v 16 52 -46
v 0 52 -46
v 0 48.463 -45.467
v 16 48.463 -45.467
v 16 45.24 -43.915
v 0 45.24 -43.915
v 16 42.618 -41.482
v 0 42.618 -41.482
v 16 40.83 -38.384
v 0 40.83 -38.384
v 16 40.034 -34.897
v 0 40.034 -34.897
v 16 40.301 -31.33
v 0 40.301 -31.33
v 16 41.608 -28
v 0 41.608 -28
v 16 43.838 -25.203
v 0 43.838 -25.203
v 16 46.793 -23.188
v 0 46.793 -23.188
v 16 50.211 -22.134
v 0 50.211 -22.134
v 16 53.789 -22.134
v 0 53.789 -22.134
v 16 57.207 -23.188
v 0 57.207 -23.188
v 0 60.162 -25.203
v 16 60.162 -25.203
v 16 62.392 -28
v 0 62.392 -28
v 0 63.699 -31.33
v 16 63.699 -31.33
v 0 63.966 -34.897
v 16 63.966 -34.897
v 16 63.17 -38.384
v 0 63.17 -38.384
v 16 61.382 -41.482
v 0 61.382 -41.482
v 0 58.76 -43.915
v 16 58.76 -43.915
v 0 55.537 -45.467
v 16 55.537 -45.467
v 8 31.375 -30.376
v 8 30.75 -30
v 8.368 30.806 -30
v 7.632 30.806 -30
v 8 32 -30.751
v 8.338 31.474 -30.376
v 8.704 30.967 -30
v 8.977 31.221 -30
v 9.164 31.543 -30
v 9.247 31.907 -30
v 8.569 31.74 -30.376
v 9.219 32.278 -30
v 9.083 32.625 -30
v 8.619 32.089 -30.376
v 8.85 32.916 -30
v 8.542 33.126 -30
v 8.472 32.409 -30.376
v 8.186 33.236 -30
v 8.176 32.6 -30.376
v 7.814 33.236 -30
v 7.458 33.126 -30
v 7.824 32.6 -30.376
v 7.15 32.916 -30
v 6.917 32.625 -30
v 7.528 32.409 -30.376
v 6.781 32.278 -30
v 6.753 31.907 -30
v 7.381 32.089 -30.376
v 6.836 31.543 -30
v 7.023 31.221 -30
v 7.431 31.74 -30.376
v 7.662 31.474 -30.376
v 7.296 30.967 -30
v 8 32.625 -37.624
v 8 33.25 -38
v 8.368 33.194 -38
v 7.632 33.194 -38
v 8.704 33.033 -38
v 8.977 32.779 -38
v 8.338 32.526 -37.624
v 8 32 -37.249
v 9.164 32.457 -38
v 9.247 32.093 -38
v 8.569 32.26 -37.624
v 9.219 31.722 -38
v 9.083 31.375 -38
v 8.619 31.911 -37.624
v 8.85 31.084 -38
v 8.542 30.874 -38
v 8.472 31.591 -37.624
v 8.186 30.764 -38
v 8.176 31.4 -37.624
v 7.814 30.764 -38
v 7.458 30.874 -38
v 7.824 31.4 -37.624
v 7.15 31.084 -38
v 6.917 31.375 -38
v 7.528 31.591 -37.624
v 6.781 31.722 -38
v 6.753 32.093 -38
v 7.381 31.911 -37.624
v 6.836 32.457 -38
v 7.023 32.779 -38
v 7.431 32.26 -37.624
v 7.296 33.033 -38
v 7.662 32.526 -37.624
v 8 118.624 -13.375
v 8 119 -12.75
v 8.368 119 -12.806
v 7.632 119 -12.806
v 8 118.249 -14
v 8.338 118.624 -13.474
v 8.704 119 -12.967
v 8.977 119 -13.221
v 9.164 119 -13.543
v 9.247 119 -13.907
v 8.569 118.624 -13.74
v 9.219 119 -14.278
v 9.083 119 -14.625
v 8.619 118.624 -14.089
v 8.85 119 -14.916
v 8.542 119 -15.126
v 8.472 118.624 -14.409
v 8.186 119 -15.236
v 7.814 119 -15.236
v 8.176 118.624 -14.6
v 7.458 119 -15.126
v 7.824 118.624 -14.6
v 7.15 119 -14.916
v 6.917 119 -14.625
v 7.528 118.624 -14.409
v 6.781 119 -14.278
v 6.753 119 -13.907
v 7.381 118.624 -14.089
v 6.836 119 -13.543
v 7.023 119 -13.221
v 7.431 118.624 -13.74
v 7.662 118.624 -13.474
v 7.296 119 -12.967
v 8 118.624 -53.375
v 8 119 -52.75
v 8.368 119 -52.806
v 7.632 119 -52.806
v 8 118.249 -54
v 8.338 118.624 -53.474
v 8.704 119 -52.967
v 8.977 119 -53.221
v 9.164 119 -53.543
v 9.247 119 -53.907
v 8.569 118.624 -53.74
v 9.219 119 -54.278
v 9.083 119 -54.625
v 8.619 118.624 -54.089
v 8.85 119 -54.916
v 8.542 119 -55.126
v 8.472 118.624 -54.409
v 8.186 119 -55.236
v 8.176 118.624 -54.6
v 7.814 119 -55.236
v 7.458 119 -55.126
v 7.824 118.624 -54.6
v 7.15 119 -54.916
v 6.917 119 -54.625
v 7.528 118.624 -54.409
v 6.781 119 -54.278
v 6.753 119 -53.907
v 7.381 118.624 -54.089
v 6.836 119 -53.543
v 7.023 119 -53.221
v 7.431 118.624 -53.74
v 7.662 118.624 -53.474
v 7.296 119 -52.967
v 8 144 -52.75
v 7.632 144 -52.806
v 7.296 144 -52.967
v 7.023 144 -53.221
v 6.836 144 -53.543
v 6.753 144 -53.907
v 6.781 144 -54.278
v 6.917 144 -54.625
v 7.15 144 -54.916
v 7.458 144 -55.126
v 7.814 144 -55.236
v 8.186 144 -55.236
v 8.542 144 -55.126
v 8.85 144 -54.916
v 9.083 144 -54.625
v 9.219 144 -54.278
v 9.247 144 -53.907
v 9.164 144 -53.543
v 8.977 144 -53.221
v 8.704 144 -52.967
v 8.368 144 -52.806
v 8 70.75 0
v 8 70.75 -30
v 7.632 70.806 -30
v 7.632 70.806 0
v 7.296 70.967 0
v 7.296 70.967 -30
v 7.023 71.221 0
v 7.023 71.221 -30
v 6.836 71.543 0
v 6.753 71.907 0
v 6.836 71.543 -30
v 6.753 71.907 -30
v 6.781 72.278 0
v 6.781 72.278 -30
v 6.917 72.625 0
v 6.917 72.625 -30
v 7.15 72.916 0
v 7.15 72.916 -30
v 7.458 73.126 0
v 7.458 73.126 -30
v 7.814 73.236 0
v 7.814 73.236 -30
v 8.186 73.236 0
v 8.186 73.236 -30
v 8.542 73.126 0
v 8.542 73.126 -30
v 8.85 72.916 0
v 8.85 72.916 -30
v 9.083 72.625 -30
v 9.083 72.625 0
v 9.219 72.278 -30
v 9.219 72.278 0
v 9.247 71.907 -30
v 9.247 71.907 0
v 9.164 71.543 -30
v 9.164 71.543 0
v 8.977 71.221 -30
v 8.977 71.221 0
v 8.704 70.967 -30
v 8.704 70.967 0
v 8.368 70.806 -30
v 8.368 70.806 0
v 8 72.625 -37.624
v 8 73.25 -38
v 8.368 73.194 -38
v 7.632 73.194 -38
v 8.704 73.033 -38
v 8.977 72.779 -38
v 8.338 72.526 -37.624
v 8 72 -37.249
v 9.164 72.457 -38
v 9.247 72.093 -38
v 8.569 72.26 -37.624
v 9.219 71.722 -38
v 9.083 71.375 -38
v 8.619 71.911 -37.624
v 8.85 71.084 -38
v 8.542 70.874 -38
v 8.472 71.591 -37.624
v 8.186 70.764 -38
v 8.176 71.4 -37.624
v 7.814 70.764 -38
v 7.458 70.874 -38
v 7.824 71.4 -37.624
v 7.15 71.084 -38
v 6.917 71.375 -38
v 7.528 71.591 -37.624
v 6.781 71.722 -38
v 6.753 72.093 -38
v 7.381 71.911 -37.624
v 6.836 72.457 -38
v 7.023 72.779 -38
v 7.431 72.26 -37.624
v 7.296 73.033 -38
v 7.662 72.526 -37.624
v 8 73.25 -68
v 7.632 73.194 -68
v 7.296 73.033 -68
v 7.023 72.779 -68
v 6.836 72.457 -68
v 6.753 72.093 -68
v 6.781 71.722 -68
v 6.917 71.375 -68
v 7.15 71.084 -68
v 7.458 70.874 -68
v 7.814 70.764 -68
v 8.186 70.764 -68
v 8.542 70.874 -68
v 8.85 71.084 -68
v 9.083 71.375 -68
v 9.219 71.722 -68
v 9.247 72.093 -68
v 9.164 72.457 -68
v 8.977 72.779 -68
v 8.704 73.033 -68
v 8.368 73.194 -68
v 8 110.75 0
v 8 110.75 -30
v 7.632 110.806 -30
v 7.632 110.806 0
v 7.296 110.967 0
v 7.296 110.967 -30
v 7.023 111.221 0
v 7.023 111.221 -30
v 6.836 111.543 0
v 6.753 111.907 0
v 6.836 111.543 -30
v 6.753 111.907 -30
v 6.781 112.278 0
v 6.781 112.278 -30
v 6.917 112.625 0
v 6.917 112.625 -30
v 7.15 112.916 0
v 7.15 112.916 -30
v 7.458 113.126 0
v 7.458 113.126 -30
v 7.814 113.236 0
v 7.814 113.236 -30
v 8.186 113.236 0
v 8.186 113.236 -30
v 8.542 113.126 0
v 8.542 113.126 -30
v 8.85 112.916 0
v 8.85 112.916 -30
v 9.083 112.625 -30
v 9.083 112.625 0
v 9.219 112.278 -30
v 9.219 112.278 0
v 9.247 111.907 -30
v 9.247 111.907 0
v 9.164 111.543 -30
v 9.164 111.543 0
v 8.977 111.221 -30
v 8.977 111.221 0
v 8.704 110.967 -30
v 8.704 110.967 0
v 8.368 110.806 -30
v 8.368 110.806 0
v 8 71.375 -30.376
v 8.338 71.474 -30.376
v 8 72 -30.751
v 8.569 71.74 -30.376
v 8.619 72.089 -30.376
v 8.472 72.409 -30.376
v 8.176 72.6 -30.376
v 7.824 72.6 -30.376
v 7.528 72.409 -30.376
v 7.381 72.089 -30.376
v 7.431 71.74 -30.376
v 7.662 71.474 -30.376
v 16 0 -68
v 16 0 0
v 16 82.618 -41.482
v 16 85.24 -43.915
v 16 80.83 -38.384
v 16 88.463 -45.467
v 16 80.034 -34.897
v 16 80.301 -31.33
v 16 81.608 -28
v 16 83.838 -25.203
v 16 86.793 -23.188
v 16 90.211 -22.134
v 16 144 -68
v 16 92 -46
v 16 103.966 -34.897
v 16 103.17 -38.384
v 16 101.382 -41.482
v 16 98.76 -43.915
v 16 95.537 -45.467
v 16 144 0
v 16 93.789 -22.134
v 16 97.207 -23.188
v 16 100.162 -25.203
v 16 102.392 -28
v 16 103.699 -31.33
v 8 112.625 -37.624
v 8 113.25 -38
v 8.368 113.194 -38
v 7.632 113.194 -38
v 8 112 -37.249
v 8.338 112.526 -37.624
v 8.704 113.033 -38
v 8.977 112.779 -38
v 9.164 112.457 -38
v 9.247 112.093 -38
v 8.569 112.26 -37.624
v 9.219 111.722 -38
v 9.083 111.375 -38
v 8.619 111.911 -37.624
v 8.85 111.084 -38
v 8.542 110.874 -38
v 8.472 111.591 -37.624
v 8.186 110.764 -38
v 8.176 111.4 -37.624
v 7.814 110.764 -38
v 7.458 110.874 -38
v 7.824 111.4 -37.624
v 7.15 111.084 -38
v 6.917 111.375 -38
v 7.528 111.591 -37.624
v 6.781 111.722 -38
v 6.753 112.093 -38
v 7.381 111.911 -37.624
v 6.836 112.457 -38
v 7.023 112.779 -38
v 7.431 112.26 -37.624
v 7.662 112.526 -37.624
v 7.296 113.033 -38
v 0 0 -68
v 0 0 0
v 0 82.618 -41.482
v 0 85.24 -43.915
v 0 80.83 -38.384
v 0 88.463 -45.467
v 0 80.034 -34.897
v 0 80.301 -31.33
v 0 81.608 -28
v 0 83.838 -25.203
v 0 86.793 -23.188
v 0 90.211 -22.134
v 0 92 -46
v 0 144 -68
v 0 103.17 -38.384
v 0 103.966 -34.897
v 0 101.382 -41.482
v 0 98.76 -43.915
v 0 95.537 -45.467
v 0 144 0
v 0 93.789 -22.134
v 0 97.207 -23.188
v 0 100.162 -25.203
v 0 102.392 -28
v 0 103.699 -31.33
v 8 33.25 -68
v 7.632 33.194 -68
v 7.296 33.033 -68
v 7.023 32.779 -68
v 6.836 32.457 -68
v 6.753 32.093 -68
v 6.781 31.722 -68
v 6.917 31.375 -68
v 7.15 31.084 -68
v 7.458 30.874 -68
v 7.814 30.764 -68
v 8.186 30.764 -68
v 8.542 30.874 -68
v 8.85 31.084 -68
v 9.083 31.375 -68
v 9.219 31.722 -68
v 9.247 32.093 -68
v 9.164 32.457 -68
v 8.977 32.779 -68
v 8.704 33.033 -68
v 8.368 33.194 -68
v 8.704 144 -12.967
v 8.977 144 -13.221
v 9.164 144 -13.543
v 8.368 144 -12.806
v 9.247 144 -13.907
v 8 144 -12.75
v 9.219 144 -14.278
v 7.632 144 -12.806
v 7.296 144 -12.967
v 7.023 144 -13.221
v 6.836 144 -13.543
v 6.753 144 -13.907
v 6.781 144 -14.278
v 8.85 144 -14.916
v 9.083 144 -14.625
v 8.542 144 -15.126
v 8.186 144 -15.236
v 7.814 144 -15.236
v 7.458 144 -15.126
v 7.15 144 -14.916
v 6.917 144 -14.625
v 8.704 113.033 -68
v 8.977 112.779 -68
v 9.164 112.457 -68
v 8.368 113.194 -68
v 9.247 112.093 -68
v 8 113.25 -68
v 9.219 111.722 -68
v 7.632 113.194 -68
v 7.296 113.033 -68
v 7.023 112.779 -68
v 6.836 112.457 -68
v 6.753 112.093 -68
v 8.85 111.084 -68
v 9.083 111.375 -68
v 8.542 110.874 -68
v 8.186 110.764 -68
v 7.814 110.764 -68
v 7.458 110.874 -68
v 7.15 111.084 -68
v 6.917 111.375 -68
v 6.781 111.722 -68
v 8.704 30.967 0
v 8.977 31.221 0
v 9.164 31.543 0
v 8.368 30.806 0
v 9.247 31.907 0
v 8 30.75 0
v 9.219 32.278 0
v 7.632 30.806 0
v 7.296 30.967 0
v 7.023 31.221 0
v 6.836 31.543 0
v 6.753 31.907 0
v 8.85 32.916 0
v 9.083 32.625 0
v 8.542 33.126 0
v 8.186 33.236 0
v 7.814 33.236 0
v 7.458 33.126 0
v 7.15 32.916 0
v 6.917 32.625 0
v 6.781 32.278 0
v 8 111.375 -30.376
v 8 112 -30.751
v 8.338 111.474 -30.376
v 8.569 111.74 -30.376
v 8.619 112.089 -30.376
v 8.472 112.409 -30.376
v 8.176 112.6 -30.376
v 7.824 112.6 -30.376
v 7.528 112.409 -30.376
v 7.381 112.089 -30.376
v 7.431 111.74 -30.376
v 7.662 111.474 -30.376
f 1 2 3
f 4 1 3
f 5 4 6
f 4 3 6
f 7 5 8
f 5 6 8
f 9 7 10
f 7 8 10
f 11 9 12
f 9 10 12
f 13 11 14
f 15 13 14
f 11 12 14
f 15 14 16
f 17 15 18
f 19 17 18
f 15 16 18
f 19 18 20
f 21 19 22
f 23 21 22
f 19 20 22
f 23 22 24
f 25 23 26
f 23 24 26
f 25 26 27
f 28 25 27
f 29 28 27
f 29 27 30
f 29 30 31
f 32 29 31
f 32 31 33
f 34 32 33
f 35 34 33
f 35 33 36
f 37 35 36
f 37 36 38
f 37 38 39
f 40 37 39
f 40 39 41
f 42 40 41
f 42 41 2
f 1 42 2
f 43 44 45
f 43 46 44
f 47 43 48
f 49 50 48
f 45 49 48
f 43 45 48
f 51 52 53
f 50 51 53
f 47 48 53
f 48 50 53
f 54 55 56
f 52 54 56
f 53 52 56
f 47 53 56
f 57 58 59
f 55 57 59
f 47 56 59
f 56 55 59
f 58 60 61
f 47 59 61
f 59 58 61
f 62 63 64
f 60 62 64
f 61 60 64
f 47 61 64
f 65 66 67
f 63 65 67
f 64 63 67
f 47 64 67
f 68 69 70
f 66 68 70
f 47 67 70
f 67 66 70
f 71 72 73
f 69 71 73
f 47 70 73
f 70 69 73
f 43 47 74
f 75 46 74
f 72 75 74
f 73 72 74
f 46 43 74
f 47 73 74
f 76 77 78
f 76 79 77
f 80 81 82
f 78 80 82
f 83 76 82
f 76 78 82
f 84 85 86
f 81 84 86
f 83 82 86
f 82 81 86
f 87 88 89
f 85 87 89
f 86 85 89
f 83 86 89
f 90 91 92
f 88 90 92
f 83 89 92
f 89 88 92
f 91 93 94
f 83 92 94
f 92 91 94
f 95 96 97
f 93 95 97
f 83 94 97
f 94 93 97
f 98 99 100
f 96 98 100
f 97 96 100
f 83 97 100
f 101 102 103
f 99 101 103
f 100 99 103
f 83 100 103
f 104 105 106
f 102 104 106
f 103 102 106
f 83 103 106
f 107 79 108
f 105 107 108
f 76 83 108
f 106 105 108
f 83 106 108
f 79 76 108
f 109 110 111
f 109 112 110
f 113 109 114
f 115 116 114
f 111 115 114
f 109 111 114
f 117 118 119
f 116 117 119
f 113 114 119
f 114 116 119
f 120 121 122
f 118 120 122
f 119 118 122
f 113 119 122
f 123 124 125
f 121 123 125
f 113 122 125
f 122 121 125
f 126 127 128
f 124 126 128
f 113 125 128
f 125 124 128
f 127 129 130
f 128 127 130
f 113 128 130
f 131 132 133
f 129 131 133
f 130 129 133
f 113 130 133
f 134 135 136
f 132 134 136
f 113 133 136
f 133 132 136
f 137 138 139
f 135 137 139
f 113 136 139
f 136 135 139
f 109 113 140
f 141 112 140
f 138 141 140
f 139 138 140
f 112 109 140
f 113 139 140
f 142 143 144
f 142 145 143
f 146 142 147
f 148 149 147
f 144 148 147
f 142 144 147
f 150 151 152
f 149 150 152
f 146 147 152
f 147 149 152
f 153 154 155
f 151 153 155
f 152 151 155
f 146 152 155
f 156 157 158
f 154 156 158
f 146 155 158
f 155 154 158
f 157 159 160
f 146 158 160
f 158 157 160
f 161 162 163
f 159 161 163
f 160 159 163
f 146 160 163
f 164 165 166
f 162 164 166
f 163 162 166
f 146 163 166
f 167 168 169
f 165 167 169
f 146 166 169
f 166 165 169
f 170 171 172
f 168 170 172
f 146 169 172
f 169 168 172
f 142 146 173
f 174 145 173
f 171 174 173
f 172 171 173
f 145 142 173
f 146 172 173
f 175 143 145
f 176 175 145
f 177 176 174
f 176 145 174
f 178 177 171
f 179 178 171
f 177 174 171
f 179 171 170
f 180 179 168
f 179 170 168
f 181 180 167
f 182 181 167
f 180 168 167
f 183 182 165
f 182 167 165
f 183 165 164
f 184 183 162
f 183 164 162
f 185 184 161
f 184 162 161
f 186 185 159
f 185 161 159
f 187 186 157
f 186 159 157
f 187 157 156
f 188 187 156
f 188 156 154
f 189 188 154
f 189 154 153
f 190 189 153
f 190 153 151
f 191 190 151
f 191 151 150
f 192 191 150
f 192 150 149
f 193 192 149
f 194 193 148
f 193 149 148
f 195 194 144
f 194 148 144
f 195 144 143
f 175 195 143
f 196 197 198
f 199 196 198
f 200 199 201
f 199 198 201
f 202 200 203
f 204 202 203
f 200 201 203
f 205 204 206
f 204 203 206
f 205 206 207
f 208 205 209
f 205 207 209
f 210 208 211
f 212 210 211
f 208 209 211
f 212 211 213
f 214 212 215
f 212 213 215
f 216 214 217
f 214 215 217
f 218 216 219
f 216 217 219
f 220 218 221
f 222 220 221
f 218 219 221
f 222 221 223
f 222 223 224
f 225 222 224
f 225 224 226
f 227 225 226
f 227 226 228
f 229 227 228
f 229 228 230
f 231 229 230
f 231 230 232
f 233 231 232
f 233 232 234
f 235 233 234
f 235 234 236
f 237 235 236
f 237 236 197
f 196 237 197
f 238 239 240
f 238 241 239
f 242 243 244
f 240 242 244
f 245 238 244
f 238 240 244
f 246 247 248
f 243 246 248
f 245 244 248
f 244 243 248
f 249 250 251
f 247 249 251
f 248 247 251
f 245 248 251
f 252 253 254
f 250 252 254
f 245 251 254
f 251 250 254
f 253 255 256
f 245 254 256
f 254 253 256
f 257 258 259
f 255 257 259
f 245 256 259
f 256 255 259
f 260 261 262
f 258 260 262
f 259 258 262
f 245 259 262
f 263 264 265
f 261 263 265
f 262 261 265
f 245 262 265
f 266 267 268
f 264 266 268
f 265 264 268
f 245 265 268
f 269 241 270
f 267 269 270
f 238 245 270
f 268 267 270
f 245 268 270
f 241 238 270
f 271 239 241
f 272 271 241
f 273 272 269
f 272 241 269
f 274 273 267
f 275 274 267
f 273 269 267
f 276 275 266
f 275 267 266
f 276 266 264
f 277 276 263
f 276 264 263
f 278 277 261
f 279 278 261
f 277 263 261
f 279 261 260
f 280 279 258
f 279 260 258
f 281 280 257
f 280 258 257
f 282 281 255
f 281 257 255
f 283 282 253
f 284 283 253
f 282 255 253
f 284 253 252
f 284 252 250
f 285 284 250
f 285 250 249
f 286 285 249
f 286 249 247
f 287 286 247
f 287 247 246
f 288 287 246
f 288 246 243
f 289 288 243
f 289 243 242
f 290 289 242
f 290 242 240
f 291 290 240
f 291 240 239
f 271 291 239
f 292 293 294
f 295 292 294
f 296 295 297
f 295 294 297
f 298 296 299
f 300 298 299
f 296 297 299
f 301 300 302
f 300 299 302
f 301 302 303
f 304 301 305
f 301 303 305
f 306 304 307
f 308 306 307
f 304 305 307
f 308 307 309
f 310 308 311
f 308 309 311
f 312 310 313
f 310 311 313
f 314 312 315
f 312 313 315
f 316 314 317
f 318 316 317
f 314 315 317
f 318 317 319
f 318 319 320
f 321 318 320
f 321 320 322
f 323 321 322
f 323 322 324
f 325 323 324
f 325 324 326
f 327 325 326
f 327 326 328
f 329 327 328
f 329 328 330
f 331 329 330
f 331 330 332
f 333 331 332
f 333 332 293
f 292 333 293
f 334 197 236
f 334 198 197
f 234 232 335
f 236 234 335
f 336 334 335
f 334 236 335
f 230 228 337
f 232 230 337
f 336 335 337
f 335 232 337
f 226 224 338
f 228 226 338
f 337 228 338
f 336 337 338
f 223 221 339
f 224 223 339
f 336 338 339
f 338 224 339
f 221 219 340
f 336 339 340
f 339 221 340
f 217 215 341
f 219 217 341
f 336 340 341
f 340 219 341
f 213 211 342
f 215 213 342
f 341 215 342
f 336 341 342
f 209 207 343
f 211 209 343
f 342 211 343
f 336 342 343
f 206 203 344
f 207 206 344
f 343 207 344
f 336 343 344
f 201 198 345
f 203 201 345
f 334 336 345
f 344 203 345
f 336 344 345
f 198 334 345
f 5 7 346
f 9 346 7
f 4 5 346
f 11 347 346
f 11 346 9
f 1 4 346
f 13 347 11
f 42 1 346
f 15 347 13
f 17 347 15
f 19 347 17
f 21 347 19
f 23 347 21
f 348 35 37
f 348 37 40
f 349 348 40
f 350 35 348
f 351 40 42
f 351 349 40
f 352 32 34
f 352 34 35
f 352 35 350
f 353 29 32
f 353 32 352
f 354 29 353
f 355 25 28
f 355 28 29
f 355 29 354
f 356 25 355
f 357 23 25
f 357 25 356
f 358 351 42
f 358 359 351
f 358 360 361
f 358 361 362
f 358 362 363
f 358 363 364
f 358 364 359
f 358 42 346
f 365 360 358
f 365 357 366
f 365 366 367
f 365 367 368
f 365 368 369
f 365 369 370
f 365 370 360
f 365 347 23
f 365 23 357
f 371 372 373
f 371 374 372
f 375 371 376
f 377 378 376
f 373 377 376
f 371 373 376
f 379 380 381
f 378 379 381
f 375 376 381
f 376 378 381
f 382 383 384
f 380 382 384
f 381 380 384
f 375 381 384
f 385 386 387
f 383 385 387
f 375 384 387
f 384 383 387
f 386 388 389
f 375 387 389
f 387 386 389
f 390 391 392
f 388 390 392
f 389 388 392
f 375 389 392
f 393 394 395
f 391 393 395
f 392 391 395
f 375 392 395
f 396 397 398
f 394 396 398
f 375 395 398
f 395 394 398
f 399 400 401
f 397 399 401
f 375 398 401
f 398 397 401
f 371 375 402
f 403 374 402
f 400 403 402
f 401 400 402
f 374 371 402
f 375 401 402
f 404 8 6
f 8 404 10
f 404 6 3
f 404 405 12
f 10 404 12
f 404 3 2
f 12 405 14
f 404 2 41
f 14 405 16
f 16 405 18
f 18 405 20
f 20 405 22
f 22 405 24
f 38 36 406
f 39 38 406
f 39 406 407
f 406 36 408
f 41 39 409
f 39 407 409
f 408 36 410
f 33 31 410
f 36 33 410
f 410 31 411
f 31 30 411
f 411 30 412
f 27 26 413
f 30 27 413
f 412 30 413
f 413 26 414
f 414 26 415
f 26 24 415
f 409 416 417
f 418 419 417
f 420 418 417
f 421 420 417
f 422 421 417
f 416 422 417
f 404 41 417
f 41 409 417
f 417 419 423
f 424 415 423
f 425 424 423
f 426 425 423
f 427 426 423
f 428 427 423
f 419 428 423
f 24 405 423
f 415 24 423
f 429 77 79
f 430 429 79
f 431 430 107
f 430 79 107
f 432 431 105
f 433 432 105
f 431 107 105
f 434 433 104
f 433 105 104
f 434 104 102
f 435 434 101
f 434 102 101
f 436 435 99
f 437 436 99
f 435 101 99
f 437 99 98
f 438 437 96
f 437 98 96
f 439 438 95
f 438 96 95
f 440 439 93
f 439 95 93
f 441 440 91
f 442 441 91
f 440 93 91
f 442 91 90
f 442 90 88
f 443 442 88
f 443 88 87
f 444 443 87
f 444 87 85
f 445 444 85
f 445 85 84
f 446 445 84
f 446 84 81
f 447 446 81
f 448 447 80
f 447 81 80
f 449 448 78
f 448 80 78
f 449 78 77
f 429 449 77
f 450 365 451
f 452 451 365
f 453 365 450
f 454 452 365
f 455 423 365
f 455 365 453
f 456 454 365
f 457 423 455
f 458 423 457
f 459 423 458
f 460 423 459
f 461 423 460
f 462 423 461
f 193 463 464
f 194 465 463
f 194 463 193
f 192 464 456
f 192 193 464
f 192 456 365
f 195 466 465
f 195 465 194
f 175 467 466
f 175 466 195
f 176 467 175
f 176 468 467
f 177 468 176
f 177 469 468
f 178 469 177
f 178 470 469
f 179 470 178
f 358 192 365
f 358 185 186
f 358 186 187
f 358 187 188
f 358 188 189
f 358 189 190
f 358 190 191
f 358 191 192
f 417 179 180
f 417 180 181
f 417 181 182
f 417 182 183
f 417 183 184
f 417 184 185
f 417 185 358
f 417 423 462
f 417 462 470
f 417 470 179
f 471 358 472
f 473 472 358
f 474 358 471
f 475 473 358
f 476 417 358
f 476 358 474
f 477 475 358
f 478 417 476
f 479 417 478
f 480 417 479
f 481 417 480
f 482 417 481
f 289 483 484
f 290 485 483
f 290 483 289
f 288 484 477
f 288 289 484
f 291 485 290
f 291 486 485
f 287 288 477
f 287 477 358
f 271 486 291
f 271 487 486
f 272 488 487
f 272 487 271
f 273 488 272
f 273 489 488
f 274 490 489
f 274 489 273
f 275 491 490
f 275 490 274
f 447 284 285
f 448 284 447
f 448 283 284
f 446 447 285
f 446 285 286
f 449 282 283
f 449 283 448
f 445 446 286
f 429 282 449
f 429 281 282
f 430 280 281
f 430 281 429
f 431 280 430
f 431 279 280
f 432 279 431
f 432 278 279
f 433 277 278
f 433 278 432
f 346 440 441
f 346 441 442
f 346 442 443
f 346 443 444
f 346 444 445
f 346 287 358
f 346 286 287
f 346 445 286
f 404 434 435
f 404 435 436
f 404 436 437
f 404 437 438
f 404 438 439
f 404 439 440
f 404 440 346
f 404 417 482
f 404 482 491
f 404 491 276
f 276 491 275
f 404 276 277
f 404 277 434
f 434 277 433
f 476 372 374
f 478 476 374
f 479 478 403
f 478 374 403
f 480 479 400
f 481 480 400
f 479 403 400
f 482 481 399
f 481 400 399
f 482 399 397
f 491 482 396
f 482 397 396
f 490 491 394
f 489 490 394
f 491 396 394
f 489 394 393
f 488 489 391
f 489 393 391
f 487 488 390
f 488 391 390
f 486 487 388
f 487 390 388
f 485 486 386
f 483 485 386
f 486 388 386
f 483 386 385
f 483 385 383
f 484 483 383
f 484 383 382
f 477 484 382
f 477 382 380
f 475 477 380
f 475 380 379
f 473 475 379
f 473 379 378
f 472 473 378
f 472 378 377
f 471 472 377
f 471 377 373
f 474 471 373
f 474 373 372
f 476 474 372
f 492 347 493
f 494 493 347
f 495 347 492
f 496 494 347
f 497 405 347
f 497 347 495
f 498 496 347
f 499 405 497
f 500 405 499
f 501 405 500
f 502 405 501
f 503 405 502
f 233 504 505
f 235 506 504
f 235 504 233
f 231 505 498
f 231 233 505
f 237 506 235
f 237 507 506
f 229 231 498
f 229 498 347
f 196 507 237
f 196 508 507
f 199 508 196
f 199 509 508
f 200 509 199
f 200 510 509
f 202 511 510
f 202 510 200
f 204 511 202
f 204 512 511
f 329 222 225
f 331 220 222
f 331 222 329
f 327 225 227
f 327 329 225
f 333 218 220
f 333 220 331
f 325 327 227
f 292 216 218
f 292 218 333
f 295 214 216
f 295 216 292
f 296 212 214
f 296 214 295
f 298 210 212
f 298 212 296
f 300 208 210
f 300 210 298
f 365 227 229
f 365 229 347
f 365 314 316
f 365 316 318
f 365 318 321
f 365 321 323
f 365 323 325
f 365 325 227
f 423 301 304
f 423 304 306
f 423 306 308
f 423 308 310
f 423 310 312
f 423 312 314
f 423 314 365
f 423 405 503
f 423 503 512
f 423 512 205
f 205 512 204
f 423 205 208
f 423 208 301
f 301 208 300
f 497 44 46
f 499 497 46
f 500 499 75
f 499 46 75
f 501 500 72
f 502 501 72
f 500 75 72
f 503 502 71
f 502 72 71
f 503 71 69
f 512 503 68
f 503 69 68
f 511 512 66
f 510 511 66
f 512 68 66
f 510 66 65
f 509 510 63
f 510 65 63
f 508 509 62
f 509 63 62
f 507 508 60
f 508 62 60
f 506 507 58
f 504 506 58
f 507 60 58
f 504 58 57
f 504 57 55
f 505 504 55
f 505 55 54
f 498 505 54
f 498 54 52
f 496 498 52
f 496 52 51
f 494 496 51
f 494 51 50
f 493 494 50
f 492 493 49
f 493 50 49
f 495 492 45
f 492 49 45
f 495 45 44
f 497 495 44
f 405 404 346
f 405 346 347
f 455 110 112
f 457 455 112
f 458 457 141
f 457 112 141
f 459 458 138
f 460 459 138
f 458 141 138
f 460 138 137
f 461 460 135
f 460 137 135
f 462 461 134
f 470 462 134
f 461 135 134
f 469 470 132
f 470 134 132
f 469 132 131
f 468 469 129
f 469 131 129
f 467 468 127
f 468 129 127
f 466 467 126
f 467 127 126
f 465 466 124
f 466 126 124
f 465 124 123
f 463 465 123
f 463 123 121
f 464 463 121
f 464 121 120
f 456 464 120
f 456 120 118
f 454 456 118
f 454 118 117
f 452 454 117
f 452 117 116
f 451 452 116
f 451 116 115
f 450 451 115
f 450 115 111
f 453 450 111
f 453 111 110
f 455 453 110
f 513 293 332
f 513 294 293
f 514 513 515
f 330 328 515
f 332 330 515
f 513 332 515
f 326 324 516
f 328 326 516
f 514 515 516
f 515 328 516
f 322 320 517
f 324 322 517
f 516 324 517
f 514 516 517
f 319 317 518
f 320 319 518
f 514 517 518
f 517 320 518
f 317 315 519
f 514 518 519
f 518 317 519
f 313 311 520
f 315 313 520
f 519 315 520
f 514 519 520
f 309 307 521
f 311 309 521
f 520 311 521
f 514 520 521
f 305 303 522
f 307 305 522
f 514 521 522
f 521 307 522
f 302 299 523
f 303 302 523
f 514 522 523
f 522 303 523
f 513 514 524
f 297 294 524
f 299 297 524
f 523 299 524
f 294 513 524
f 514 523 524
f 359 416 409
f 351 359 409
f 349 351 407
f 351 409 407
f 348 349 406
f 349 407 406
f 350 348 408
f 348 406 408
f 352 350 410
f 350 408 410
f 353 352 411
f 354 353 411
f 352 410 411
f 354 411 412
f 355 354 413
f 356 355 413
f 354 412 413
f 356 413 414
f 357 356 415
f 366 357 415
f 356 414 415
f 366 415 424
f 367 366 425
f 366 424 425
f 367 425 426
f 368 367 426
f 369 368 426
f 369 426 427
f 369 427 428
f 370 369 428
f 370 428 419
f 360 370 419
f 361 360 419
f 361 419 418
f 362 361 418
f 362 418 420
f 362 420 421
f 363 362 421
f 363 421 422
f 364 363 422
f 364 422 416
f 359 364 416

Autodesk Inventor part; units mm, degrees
ref_plane "YZ Plane" through (0, 0, 0) normal (1, 0, 0) x (0, 1, 0)
ref_plane "XZ Plane" through (0, 0, 0) normal (0, 1, 0) x (-1, 0, 0)
ref_plane "XY Plane" through (0, 0, 0) normal (0, 0, 1) x (1, 0, 0)
sketch "Skizze1" plane through (0, 0, 0) normal (1, 0, 0) x (0, 1, 0)
  line L0 (0, 0) -> (144, 0)
  line L1 (144, 0) -> (144, -68)
  line L2 (144, -68) -> (0, -68)
  line L3 (0, -68) -> (0, 0)
  dimension "d0" = 144
  dimension "d1" = 68
extrude "Extrusion1" add sketch "Skizze1" along normal blind 16
sketch "Skizze2" plane through (0, 0, 0) normal (0, 0, 1) x (1, 0, 0)
  line L0 (0, 0) -> (0, 144) construction
  line L1 (0, 72) -> (16, 72) construction
  line L2 (16, 144) -> (16, 0) construction
  line L3 (0, 144) -> (16, 144) construction
  line L4 (8, 144) -> (8, 0) construction
  line L5 (0, 144) -> (16, 144) construction
  line L6 (0, 0) -> (16, 0) construction
  line L7 (0, 144) -> (16, 144) construction
  line L8 (16, 144) -> (16, 0) construction
  line L9 (16, 0) -> (0, 0) construction
  line L10 (0, 0) -> (0, 144) construction
  line L11 (0, 112) -> (16, 112) construction
  line L12 (0, 32) -> (16, 32) construction
  point P0 (8, 112)
  point P1 (8, 72)
  point P2 (8, 32)
  dimension "d4" = 40
  dimension "d5" = 40
hole "Bohrung1" at (8, 112, 0) at (8, 72, 0) at (8, 32, 0) direction (0, 0, -1) diameter 2.5 depth 30 tip angle 118
sketch "Skizze3" plane through (0, 144, 0) normal (0, 1, 0) x (1, 0, 0)
  line L0 (0, 0) -> (16, 0)
  line L1 (16, 0) -> (16, 68)
  line L2 (16, 68) -> (0, 68)
  line L3 (0, 68) -> (0, 0)
  line L4 (8, 0) -> (8, 68) construction
  line L5 (0, 68) -> (16, 68) construction
  line L6 (16, 0) -> (16, 68) construction
  line L7 (16, 34) -> (0, 34) construction
  line L8 (0, 68) -> (0, 0) construction
  line L9 (0, 14) -> (16, 14) construction
  line L10 (0, 54) -> (16, 54) construction
  point P0 (8, 14)
  point P1 (8, 54)
  dimension "d13" = 14
  dimension "d22" = 14
hole "Bohrung2" at (8, 144, -14) at (8, 144, -54) direction (0, -1, 0) diameter 2.5 depth 25 tip angle 118
sketch "Skizze4" plane through (0, 0, -68) normal (0, 0, -1) x (-1, 0, 0)
  line L0 (0, 0) -> (-16, 0) construction
  line L1 (-16, 0) -> (-16, 144) construction
  line L2 (-16, 144) -> (0, 144) construction
  line L3 (0, 144) -> (0, 0) construction
  line L4 (-8, 0) -> (-8, 144) construction
  line L5 (-16, 144) -> (-16, 0) construction
  line L6 (-16, 72) -> (0, 72) construction
  circle A0 centre (-8, 72) radius 1.25 construction
  point P0 (-8, 112)
  point P1 (-8, 32)
  dimension "d23" = 40
  dimension "d24" = 40
hole "Bohrung3" at (8, 72, -68) at (8, 112, -68) at (8, 32, -68) direction (0, 0, 1) diameter 2.5 depth 30 tip angle 118
sketch "Skizze5" plane through (16, 0, 0) normal (1, 0, 0) x (0, 0, -1)
  line L0 (0, 0) -> (68, 0) construction
  line L1 (68, 0) -> (68, 144) construction
  line L2 (68, 144) -> (0, 144) construction
  line L3 (0, 144) -> (0, 0) construction
  line L4 (0, 0) -> (68, 0) construction
  line L5 (34, 0) -> (34, 144) construction
  line L6 (0, 72) -> (68, 72) construction
  line L7 (68, 73.25) -> (68, 70.75) construction
  point P0 (34, 52)
  point P1 (34, 92)
  dimension "d32" = 20
  dimension "d33" = 20
hole "Bohrung4" at (16, 52, -34) at (16, 92, -34) direction (-1, 0, 0) diameter 24 end through all
equation "\"d39\" = Stärke"
equation "\"Biegeradius\" = Stärke"
equation "\"BreiteBiegungsfreistellung\" = Stärke"
equation "\"TiefeBiegungsfreistellung\" = 0.5 * Stärke"
equation "\"GrößeEckenfreistellung\" = 4 * Stärke"
equation "\"MinimalRest\" = 2 * Stärke"
equation "\"Übergangsradius\" = Biegeradius"
equation "\"JacobiRadiusGröße\" = Biegeradius"
equation "\"Abstandsgröße\" = Stärke"
equation "\"Stärke\" = 0.5"
properties part number "licht_200_side_middle" material "Spanplatte"
